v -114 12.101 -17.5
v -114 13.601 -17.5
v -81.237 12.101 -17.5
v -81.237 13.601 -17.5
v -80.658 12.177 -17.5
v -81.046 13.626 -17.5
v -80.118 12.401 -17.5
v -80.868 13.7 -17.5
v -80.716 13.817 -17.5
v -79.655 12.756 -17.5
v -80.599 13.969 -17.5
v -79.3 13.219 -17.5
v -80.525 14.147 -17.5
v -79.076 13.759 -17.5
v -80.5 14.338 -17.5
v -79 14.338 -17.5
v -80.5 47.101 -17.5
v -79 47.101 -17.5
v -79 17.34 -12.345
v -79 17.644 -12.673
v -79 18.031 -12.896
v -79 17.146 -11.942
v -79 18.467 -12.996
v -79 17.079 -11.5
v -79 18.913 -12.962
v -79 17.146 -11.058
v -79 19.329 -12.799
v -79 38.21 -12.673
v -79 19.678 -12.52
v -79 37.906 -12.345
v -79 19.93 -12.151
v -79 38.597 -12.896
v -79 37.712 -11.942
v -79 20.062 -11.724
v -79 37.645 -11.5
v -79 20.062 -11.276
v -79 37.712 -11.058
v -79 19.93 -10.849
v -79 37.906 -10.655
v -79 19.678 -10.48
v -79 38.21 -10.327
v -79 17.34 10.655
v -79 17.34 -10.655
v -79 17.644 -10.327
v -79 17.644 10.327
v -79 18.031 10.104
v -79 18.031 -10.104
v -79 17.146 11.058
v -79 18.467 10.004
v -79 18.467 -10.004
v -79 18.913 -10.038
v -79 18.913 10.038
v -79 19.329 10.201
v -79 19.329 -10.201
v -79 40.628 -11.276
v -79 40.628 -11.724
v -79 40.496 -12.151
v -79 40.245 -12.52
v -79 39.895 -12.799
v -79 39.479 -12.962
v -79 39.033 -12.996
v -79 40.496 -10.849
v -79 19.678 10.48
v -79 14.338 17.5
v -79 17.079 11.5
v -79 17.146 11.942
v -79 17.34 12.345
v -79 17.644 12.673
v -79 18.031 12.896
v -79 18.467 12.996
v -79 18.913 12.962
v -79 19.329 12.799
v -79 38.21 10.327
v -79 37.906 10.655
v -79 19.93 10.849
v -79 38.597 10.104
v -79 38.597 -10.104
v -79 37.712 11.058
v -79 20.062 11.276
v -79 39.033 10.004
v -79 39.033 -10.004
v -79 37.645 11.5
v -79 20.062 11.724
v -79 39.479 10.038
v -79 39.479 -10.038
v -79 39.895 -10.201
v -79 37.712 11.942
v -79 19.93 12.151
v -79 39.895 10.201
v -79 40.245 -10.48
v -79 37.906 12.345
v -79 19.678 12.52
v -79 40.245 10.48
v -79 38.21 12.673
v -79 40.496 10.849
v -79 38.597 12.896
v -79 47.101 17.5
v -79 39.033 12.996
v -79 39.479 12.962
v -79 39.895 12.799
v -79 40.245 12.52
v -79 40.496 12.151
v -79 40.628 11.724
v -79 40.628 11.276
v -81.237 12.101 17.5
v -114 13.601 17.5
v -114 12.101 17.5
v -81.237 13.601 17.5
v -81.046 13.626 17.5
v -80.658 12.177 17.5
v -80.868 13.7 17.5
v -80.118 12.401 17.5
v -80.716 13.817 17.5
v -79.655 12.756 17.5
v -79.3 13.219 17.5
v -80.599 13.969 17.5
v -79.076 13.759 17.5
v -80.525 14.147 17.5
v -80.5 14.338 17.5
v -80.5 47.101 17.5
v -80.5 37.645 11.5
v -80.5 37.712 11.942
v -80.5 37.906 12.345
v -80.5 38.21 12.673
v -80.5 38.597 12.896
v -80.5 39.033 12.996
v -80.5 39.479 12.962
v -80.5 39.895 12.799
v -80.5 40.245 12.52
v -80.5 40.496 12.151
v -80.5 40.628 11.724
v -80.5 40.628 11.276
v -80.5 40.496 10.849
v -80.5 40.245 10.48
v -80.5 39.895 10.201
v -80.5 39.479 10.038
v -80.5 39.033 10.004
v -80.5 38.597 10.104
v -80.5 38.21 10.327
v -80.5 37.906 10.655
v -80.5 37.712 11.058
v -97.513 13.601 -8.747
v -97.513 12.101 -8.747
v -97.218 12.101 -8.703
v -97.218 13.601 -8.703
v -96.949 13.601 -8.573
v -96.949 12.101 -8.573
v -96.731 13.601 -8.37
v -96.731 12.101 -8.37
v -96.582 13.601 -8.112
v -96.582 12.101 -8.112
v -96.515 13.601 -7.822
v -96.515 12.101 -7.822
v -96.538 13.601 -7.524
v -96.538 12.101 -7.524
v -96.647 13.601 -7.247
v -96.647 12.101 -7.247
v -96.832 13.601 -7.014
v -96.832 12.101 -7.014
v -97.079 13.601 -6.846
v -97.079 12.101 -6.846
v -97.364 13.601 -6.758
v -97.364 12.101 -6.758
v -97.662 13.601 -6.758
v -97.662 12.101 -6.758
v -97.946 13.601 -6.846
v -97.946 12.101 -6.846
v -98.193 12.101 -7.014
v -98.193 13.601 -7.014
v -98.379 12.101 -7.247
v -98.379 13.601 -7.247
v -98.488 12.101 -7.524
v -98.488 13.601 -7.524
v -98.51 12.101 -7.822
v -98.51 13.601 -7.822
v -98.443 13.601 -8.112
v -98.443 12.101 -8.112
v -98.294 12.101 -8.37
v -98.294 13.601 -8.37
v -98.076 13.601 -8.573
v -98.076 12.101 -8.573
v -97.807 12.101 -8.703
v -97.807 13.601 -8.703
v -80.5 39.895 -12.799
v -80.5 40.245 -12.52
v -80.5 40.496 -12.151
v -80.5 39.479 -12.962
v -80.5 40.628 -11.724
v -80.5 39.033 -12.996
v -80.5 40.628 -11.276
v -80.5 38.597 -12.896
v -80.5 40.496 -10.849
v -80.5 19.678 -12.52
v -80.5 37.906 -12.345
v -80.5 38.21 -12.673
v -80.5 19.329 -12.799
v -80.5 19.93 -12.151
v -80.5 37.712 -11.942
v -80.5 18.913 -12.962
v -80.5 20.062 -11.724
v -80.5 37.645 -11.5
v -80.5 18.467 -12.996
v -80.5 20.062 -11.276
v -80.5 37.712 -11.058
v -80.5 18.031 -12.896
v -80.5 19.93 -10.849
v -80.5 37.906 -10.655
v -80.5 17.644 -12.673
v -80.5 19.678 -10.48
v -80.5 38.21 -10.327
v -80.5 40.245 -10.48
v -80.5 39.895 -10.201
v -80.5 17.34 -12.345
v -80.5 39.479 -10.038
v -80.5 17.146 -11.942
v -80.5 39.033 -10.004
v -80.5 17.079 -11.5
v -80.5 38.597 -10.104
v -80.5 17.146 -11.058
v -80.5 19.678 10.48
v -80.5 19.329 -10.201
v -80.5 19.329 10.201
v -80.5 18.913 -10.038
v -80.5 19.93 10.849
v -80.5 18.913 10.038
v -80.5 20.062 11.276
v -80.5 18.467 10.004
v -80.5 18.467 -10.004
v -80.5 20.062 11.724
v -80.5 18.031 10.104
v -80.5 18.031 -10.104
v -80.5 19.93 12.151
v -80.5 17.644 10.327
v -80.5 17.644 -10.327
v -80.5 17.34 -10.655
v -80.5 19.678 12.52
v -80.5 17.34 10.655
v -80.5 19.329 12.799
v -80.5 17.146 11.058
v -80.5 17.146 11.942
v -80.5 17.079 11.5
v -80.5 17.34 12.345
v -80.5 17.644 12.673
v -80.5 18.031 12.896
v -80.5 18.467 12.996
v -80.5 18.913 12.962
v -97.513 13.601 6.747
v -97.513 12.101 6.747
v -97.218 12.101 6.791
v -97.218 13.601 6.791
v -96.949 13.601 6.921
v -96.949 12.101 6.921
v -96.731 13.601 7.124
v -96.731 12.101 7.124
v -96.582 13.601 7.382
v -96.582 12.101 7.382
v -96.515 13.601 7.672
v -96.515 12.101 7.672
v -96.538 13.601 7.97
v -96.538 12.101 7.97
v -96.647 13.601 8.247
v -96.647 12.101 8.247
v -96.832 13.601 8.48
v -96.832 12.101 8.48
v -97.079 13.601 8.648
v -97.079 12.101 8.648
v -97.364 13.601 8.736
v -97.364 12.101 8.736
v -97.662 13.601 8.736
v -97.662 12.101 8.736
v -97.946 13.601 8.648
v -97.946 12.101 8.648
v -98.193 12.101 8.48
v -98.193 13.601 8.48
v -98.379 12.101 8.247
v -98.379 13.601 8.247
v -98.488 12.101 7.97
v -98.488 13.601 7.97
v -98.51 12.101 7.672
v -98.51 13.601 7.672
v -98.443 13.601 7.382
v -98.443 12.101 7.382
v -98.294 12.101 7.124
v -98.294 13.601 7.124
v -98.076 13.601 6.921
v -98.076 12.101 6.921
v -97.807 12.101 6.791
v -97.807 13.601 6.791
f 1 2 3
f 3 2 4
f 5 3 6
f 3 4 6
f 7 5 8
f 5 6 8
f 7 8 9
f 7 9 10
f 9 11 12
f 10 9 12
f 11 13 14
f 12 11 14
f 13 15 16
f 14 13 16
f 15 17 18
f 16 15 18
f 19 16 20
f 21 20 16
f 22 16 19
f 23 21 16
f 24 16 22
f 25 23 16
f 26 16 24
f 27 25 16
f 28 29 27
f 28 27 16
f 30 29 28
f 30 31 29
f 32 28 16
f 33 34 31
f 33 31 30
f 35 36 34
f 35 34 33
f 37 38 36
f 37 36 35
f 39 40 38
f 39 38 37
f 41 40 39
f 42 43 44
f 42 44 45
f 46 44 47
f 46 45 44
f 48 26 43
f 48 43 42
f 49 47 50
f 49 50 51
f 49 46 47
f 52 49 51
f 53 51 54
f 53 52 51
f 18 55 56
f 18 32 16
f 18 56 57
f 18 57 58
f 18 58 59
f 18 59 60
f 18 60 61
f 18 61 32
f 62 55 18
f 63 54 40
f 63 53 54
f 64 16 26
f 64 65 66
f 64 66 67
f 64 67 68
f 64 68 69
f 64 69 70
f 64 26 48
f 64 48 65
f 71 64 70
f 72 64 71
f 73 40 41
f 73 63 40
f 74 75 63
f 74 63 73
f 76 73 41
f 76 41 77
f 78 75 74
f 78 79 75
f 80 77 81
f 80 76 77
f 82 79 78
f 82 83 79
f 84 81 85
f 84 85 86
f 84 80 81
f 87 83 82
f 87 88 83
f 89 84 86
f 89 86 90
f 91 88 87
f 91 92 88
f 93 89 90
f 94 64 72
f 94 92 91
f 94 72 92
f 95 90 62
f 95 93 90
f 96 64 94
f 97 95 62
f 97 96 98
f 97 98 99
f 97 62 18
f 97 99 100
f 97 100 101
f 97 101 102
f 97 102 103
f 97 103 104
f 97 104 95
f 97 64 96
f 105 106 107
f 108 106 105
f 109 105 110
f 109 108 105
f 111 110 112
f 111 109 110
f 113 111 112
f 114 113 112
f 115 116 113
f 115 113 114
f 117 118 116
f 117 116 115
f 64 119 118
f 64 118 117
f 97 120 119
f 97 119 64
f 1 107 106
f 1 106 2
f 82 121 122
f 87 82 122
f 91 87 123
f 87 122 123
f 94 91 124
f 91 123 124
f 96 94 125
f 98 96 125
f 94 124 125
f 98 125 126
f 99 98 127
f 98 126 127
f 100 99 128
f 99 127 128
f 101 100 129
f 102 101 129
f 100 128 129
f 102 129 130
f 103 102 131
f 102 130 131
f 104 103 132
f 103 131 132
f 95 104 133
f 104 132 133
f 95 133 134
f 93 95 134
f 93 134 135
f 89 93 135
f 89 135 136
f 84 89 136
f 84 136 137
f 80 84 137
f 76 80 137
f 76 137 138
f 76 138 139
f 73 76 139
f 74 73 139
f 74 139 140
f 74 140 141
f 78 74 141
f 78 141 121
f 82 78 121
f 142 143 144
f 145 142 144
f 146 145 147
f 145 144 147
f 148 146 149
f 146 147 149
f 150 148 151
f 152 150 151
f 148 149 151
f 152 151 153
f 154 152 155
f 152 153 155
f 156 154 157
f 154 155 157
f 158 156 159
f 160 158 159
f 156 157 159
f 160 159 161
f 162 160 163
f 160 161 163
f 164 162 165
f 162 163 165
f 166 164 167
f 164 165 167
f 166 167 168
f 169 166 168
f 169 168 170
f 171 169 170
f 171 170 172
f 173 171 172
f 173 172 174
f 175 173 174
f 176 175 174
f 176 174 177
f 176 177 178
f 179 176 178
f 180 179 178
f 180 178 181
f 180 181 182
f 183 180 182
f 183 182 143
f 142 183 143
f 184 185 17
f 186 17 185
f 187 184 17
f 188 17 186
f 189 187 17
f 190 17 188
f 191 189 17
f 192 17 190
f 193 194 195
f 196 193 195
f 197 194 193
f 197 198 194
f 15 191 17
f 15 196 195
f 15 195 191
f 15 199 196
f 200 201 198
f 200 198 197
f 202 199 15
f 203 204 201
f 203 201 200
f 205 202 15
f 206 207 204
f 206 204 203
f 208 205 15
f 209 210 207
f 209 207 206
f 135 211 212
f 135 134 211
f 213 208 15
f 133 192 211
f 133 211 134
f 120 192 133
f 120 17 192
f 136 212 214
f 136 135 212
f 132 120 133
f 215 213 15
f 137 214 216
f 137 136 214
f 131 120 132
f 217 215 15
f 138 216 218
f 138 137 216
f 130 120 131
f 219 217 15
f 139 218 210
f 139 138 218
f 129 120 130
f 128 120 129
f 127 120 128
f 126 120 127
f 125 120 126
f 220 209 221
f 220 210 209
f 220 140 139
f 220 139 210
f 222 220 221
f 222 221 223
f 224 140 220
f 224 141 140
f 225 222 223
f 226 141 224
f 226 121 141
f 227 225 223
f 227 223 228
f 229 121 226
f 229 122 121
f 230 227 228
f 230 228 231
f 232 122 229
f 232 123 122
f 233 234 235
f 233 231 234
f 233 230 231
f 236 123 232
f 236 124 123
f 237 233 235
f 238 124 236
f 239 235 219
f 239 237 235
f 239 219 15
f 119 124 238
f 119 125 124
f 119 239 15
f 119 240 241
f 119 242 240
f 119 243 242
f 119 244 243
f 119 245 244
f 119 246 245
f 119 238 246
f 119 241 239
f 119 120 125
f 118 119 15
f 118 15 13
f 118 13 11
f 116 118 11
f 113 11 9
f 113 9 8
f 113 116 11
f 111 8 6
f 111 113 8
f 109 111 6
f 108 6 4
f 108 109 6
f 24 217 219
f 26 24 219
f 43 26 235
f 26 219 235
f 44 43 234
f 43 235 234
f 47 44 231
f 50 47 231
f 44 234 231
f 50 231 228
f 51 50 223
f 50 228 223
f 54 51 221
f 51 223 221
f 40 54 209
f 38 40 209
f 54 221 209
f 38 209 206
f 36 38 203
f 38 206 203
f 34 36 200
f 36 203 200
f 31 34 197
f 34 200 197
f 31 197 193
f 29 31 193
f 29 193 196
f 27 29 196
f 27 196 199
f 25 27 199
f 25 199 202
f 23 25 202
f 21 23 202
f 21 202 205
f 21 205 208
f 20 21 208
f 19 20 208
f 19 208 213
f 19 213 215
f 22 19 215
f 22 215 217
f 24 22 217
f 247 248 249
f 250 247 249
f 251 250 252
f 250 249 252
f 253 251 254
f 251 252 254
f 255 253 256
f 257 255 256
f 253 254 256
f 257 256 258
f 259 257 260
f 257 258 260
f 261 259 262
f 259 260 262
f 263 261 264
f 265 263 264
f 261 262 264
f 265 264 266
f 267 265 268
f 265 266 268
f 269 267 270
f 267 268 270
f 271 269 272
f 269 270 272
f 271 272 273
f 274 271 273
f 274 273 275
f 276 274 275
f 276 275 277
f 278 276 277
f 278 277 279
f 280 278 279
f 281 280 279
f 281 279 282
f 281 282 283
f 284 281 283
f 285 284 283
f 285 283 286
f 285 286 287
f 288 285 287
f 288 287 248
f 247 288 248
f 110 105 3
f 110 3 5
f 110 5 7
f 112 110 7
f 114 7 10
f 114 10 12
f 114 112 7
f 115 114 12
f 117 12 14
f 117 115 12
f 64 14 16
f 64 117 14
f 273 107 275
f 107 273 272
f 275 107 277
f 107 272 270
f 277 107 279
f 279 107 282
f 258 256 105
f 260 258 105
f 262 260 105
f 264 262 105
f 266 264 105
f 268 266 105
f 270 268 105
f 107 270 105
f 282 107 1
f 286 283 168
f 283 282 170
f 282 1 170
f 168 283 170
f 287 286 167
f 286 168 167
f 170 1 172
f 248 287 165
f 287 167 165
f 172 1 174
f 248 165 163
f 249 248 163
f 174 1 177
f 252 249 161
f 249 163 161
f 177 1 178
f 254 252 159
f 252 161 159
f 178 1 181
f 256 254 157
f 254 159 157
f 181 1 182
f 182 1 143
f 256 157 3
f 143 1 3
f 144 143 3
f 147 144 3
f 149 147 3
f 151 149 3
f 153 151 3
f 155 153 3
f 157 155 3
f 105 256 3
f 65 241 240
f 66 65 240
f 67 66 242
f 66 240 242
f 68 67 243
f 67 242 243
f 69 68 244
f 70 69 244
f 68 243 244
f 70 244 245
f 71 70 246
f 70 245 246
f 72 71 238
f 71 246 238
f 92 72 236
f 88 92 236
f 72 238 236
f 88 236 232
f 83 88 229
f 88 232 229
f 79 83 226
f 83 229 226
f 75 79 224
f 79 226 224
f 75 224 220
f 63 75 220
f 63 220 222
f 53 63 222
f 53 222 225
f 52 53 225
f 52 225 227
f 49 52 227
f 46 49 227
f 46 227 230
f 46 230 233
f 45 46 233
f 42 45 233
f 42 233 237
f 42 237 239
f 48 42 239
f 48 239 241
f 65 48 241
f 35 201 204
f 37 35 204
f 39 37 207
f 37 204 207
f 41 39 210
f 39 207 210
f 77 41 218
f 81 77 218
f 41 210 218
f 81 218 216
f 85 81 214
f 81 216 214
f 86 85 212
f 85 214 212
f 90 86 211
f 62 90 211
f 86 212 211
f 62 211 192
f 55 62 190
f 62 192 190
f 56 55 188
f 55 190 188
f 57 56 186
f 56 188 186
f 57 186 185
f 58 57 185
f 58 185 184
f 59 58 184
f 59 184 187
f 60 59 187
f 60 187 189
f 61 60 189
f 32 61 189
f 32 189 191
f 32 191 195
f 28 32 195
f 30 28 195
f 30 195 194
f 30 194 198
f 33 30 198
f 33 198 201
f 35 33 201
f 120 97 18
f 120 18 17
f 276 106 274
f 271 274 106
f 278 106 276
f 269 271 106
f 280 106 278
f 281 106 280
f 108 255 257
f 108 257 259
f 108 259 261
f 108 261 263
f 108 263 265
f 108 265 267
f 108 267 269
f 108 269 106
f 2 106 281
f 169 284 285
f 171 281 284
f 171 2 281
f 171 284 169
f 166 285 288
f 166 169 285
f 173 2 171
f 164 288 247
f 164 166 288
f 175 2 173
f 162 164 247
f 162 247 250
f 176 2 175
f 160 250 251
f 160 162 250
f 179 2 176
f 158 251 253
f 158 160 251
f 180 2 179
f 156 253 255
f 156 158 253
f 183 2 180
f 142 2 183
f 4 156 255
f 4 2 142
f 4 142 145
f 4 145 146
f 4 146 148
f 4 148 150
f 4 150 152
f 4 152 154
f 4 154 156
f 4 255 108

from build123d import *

# Parameters (mm, degrees)
SKETCH1_W                    = 35
SKETCH1_H                    = 35
BASE_FLANGE1_DEPTH           = 1.5
EDGE_FLANGE1_STRIP_W         = 7.4732
EDGE_FLANGE1_STRIP_H         = 1.5
EDGE_FLANGE1_STRIP_CUT_DEPTH = 35
EDGE_FLANGE1_DEPTH           = 35
CUT_EXTRUDE1_REACH           = 62.39
SKETCH9_R                    = 1.5
CUT_EXTRUDE2_REACH           = 122.529
SKETCH10_R                   = 1


# Sheet-metal steps are written as plain solids
with BuildPart() as part:
    # Sketch1 → Base-Flange1 (new body)
    with BuildSketch(Plane(origin=(0, 12.100921456, 0), x_dir=(1, 0, 0), z_dir=(0, 1, 0))):
        with Locations((-96.5, 0)):
            Rectangle(SKETCH1_W, SKETCH1_H)
    extrude(amount=BASE_FLANGE1_DEPTH)

    # Edge-Flange1 strip (across the edge) → Edge-Flange1 strip cut (cut)
    with BuildSketch(Plane(origin=(-79, 13.600921456, 17.5), x_dir=(-1, 0, 0), z_dir=(0, 0, -1))):
        with Locations((-1.5, -0.75)):
            Rectangle(EDGE_FLANGE1_STRIP_W, EDGE_FLANGE1_STRIP_H)
    extrude(amount=EDGE_FLANGE1_STRIP_CUT_DEPTH, mode=Mode.SUBTRACT)

    # Edge-Flange1 section (across the edge) → Edge-Flange1 (add)
    with BuildSketch(Plane(origin=(-79, 13.600921456, 17.5), x_dir=(-1, 0, 0), z_dir=(0, 0, -1))):
        with BuildLine():
            Line((0, 0.7366), (0, 33.5))
            Line((0, 33.5), (1.5, 33.5))
            Line((1.5, 33.5), (1.5, 0.7366))
            ThreePointArc((1.5, 0.7366), (1.715745145, 0.215745145), (2.2366, 0))
            Line((2.2366, 0), (2.2366, -1.5))
            ThreePointArc((2.2366, -1.5), (0.655084973, -0.844915027), (0, 0.7366))
        make_face()
    extrude(amount=EDGE_FLANGE1_DEPTH)

    # Sketch9 → Cut-Extrude1 (cut, up to next)
    with BuildSketch(Plane.ZY.offset(80.5), mode=Mode.PRIVATE) as cut_extrude1_sk1:
        with Locations(Location((-11.5, 39.145, 0), (0, 0, 270))):
            Circle(SKETCH9_R)
    cut_extrude1_tool1 = extrude(cut_extrude1_sk1.sketch, amount=-CUT_EXTRUDE1_REACH, mode=Mode.PRIVATE) & part.part
    # Sketch9 → Cut-Extrude1 (cut, up to next)
    with BuildSketch(Plane.ZY.offset(80.5), mode=Mode.PRIVATE) as cut_extrude1_sk2:
        with Locations(Location((11.5, 39.145, 0), (0, 0, 270))):
            Circle(SKETCH9_R)
    cut_extrude1_tool2 = extrude(cut_extrude1_sk2.sketch, amount=-CUT_EXTRUDE1_REACH, mode=Mode.PRIVATE) & part.part
    # Sketch9 → Cut-Extrude1 (cut, up to next)
    with BuildSketch(Plane.ZY.offset(80.5), mode=Mode.PRIVATE) as cut_extrude1_sk3:
        with Locations(Location((11.5, 18.578902177, 0), (0, 0, 270))):
            Circle(SKETCH9_R)
    cut_extrude1_tool3 = extrude(cut_extrude1_sk3.sketch, amount=-CUT_EXTRUDE1_REACH, mode=Mode.PRIVATE) & part.part
    # Sketch9 → Cut-Extrude1 (cut, up to next)
    with BuildSketch(Plane.ZY.offset(80.5), mode=Mode.PRIVATE) as cut_extrude1_sk4:
        with Locations(Location((-11.5, 18.578902177, 0), (0, 0, 270))):
            Circle(SKETCH9_R)
    cut_extrude1_tool4 = extrude(cut_extrude1_sk4.sketch, amount=-CUT_EXTRUDE1_REACH, mode=Mode.PRIVATE) & part.part
    add(cut_extrude1_tool1.solids().sort_by_distance((-80.5, 39.145, -11.5))[0], mode=Mode.SUBTRACT)
    add(cut_extrude1_tool2.solids().sort_by_distance((-80.5, 39.145, 11.5))[0], mode=Mode.SUBTRACT)
    add(cut_extrude1_tool3.solids().sort_by_distance((-80.5, 18.578902, 11.5))[0], mode=Mode.SUBTRACT)
    add(cut_extrude1_tool4.solids().sort_by_distance((-80.5, 18.578902, -11.5))[0], mode=Mode.SUBTRACT)

    # Sketch10 → Cut-Extrude2 (cut, up to next)
    with BuildSketch(Plane.XZ.offset(-12.100921456), mode=Mode.PRIVATE) as cut_extrude2_sk1:
        with Locations(Location((-97.512607475, -7.747, 0), (0, 0, 270))):
            Circle(SKETCH10_R)
    cut_extrude2_tool1 = extrude(cut_extrude2_sk1.sketch, amount=-CUT_EXTRUDE2_REACH, mode=Mode.PRIVATE) & part.part
    # Sketch10 → Cut-Extrude2 (cut, up to next)
    with BuildSketch(Plane.XZ.offset(-12.100921456), mode=Mode.PRIVATE) as cut_extrude2_sk2:
        with Locations(Location((-97.512607475, 7.747, 0), (0, 0, 270))):
            Circle(SKETCH10_R)
    cut_extrude2_tool2 = extrude(cut_extrude2_sk2.sketch, amount=-CUT_EXTRUDE2_REACH, mode=Mode.PRIVATE) & part.part
    add(cut_extrude2_tool1.solids().sort_by_distance((-97.512607, 12.100921, -7.747))[0], mode=Mode.SUBTRACT)
    add(cut_extrude2_tool2.solids().sort_by_distance((-97.512607, 12.100921, 7.747))[0], mode=Mode.SUBTRACT)


solid = part.part
